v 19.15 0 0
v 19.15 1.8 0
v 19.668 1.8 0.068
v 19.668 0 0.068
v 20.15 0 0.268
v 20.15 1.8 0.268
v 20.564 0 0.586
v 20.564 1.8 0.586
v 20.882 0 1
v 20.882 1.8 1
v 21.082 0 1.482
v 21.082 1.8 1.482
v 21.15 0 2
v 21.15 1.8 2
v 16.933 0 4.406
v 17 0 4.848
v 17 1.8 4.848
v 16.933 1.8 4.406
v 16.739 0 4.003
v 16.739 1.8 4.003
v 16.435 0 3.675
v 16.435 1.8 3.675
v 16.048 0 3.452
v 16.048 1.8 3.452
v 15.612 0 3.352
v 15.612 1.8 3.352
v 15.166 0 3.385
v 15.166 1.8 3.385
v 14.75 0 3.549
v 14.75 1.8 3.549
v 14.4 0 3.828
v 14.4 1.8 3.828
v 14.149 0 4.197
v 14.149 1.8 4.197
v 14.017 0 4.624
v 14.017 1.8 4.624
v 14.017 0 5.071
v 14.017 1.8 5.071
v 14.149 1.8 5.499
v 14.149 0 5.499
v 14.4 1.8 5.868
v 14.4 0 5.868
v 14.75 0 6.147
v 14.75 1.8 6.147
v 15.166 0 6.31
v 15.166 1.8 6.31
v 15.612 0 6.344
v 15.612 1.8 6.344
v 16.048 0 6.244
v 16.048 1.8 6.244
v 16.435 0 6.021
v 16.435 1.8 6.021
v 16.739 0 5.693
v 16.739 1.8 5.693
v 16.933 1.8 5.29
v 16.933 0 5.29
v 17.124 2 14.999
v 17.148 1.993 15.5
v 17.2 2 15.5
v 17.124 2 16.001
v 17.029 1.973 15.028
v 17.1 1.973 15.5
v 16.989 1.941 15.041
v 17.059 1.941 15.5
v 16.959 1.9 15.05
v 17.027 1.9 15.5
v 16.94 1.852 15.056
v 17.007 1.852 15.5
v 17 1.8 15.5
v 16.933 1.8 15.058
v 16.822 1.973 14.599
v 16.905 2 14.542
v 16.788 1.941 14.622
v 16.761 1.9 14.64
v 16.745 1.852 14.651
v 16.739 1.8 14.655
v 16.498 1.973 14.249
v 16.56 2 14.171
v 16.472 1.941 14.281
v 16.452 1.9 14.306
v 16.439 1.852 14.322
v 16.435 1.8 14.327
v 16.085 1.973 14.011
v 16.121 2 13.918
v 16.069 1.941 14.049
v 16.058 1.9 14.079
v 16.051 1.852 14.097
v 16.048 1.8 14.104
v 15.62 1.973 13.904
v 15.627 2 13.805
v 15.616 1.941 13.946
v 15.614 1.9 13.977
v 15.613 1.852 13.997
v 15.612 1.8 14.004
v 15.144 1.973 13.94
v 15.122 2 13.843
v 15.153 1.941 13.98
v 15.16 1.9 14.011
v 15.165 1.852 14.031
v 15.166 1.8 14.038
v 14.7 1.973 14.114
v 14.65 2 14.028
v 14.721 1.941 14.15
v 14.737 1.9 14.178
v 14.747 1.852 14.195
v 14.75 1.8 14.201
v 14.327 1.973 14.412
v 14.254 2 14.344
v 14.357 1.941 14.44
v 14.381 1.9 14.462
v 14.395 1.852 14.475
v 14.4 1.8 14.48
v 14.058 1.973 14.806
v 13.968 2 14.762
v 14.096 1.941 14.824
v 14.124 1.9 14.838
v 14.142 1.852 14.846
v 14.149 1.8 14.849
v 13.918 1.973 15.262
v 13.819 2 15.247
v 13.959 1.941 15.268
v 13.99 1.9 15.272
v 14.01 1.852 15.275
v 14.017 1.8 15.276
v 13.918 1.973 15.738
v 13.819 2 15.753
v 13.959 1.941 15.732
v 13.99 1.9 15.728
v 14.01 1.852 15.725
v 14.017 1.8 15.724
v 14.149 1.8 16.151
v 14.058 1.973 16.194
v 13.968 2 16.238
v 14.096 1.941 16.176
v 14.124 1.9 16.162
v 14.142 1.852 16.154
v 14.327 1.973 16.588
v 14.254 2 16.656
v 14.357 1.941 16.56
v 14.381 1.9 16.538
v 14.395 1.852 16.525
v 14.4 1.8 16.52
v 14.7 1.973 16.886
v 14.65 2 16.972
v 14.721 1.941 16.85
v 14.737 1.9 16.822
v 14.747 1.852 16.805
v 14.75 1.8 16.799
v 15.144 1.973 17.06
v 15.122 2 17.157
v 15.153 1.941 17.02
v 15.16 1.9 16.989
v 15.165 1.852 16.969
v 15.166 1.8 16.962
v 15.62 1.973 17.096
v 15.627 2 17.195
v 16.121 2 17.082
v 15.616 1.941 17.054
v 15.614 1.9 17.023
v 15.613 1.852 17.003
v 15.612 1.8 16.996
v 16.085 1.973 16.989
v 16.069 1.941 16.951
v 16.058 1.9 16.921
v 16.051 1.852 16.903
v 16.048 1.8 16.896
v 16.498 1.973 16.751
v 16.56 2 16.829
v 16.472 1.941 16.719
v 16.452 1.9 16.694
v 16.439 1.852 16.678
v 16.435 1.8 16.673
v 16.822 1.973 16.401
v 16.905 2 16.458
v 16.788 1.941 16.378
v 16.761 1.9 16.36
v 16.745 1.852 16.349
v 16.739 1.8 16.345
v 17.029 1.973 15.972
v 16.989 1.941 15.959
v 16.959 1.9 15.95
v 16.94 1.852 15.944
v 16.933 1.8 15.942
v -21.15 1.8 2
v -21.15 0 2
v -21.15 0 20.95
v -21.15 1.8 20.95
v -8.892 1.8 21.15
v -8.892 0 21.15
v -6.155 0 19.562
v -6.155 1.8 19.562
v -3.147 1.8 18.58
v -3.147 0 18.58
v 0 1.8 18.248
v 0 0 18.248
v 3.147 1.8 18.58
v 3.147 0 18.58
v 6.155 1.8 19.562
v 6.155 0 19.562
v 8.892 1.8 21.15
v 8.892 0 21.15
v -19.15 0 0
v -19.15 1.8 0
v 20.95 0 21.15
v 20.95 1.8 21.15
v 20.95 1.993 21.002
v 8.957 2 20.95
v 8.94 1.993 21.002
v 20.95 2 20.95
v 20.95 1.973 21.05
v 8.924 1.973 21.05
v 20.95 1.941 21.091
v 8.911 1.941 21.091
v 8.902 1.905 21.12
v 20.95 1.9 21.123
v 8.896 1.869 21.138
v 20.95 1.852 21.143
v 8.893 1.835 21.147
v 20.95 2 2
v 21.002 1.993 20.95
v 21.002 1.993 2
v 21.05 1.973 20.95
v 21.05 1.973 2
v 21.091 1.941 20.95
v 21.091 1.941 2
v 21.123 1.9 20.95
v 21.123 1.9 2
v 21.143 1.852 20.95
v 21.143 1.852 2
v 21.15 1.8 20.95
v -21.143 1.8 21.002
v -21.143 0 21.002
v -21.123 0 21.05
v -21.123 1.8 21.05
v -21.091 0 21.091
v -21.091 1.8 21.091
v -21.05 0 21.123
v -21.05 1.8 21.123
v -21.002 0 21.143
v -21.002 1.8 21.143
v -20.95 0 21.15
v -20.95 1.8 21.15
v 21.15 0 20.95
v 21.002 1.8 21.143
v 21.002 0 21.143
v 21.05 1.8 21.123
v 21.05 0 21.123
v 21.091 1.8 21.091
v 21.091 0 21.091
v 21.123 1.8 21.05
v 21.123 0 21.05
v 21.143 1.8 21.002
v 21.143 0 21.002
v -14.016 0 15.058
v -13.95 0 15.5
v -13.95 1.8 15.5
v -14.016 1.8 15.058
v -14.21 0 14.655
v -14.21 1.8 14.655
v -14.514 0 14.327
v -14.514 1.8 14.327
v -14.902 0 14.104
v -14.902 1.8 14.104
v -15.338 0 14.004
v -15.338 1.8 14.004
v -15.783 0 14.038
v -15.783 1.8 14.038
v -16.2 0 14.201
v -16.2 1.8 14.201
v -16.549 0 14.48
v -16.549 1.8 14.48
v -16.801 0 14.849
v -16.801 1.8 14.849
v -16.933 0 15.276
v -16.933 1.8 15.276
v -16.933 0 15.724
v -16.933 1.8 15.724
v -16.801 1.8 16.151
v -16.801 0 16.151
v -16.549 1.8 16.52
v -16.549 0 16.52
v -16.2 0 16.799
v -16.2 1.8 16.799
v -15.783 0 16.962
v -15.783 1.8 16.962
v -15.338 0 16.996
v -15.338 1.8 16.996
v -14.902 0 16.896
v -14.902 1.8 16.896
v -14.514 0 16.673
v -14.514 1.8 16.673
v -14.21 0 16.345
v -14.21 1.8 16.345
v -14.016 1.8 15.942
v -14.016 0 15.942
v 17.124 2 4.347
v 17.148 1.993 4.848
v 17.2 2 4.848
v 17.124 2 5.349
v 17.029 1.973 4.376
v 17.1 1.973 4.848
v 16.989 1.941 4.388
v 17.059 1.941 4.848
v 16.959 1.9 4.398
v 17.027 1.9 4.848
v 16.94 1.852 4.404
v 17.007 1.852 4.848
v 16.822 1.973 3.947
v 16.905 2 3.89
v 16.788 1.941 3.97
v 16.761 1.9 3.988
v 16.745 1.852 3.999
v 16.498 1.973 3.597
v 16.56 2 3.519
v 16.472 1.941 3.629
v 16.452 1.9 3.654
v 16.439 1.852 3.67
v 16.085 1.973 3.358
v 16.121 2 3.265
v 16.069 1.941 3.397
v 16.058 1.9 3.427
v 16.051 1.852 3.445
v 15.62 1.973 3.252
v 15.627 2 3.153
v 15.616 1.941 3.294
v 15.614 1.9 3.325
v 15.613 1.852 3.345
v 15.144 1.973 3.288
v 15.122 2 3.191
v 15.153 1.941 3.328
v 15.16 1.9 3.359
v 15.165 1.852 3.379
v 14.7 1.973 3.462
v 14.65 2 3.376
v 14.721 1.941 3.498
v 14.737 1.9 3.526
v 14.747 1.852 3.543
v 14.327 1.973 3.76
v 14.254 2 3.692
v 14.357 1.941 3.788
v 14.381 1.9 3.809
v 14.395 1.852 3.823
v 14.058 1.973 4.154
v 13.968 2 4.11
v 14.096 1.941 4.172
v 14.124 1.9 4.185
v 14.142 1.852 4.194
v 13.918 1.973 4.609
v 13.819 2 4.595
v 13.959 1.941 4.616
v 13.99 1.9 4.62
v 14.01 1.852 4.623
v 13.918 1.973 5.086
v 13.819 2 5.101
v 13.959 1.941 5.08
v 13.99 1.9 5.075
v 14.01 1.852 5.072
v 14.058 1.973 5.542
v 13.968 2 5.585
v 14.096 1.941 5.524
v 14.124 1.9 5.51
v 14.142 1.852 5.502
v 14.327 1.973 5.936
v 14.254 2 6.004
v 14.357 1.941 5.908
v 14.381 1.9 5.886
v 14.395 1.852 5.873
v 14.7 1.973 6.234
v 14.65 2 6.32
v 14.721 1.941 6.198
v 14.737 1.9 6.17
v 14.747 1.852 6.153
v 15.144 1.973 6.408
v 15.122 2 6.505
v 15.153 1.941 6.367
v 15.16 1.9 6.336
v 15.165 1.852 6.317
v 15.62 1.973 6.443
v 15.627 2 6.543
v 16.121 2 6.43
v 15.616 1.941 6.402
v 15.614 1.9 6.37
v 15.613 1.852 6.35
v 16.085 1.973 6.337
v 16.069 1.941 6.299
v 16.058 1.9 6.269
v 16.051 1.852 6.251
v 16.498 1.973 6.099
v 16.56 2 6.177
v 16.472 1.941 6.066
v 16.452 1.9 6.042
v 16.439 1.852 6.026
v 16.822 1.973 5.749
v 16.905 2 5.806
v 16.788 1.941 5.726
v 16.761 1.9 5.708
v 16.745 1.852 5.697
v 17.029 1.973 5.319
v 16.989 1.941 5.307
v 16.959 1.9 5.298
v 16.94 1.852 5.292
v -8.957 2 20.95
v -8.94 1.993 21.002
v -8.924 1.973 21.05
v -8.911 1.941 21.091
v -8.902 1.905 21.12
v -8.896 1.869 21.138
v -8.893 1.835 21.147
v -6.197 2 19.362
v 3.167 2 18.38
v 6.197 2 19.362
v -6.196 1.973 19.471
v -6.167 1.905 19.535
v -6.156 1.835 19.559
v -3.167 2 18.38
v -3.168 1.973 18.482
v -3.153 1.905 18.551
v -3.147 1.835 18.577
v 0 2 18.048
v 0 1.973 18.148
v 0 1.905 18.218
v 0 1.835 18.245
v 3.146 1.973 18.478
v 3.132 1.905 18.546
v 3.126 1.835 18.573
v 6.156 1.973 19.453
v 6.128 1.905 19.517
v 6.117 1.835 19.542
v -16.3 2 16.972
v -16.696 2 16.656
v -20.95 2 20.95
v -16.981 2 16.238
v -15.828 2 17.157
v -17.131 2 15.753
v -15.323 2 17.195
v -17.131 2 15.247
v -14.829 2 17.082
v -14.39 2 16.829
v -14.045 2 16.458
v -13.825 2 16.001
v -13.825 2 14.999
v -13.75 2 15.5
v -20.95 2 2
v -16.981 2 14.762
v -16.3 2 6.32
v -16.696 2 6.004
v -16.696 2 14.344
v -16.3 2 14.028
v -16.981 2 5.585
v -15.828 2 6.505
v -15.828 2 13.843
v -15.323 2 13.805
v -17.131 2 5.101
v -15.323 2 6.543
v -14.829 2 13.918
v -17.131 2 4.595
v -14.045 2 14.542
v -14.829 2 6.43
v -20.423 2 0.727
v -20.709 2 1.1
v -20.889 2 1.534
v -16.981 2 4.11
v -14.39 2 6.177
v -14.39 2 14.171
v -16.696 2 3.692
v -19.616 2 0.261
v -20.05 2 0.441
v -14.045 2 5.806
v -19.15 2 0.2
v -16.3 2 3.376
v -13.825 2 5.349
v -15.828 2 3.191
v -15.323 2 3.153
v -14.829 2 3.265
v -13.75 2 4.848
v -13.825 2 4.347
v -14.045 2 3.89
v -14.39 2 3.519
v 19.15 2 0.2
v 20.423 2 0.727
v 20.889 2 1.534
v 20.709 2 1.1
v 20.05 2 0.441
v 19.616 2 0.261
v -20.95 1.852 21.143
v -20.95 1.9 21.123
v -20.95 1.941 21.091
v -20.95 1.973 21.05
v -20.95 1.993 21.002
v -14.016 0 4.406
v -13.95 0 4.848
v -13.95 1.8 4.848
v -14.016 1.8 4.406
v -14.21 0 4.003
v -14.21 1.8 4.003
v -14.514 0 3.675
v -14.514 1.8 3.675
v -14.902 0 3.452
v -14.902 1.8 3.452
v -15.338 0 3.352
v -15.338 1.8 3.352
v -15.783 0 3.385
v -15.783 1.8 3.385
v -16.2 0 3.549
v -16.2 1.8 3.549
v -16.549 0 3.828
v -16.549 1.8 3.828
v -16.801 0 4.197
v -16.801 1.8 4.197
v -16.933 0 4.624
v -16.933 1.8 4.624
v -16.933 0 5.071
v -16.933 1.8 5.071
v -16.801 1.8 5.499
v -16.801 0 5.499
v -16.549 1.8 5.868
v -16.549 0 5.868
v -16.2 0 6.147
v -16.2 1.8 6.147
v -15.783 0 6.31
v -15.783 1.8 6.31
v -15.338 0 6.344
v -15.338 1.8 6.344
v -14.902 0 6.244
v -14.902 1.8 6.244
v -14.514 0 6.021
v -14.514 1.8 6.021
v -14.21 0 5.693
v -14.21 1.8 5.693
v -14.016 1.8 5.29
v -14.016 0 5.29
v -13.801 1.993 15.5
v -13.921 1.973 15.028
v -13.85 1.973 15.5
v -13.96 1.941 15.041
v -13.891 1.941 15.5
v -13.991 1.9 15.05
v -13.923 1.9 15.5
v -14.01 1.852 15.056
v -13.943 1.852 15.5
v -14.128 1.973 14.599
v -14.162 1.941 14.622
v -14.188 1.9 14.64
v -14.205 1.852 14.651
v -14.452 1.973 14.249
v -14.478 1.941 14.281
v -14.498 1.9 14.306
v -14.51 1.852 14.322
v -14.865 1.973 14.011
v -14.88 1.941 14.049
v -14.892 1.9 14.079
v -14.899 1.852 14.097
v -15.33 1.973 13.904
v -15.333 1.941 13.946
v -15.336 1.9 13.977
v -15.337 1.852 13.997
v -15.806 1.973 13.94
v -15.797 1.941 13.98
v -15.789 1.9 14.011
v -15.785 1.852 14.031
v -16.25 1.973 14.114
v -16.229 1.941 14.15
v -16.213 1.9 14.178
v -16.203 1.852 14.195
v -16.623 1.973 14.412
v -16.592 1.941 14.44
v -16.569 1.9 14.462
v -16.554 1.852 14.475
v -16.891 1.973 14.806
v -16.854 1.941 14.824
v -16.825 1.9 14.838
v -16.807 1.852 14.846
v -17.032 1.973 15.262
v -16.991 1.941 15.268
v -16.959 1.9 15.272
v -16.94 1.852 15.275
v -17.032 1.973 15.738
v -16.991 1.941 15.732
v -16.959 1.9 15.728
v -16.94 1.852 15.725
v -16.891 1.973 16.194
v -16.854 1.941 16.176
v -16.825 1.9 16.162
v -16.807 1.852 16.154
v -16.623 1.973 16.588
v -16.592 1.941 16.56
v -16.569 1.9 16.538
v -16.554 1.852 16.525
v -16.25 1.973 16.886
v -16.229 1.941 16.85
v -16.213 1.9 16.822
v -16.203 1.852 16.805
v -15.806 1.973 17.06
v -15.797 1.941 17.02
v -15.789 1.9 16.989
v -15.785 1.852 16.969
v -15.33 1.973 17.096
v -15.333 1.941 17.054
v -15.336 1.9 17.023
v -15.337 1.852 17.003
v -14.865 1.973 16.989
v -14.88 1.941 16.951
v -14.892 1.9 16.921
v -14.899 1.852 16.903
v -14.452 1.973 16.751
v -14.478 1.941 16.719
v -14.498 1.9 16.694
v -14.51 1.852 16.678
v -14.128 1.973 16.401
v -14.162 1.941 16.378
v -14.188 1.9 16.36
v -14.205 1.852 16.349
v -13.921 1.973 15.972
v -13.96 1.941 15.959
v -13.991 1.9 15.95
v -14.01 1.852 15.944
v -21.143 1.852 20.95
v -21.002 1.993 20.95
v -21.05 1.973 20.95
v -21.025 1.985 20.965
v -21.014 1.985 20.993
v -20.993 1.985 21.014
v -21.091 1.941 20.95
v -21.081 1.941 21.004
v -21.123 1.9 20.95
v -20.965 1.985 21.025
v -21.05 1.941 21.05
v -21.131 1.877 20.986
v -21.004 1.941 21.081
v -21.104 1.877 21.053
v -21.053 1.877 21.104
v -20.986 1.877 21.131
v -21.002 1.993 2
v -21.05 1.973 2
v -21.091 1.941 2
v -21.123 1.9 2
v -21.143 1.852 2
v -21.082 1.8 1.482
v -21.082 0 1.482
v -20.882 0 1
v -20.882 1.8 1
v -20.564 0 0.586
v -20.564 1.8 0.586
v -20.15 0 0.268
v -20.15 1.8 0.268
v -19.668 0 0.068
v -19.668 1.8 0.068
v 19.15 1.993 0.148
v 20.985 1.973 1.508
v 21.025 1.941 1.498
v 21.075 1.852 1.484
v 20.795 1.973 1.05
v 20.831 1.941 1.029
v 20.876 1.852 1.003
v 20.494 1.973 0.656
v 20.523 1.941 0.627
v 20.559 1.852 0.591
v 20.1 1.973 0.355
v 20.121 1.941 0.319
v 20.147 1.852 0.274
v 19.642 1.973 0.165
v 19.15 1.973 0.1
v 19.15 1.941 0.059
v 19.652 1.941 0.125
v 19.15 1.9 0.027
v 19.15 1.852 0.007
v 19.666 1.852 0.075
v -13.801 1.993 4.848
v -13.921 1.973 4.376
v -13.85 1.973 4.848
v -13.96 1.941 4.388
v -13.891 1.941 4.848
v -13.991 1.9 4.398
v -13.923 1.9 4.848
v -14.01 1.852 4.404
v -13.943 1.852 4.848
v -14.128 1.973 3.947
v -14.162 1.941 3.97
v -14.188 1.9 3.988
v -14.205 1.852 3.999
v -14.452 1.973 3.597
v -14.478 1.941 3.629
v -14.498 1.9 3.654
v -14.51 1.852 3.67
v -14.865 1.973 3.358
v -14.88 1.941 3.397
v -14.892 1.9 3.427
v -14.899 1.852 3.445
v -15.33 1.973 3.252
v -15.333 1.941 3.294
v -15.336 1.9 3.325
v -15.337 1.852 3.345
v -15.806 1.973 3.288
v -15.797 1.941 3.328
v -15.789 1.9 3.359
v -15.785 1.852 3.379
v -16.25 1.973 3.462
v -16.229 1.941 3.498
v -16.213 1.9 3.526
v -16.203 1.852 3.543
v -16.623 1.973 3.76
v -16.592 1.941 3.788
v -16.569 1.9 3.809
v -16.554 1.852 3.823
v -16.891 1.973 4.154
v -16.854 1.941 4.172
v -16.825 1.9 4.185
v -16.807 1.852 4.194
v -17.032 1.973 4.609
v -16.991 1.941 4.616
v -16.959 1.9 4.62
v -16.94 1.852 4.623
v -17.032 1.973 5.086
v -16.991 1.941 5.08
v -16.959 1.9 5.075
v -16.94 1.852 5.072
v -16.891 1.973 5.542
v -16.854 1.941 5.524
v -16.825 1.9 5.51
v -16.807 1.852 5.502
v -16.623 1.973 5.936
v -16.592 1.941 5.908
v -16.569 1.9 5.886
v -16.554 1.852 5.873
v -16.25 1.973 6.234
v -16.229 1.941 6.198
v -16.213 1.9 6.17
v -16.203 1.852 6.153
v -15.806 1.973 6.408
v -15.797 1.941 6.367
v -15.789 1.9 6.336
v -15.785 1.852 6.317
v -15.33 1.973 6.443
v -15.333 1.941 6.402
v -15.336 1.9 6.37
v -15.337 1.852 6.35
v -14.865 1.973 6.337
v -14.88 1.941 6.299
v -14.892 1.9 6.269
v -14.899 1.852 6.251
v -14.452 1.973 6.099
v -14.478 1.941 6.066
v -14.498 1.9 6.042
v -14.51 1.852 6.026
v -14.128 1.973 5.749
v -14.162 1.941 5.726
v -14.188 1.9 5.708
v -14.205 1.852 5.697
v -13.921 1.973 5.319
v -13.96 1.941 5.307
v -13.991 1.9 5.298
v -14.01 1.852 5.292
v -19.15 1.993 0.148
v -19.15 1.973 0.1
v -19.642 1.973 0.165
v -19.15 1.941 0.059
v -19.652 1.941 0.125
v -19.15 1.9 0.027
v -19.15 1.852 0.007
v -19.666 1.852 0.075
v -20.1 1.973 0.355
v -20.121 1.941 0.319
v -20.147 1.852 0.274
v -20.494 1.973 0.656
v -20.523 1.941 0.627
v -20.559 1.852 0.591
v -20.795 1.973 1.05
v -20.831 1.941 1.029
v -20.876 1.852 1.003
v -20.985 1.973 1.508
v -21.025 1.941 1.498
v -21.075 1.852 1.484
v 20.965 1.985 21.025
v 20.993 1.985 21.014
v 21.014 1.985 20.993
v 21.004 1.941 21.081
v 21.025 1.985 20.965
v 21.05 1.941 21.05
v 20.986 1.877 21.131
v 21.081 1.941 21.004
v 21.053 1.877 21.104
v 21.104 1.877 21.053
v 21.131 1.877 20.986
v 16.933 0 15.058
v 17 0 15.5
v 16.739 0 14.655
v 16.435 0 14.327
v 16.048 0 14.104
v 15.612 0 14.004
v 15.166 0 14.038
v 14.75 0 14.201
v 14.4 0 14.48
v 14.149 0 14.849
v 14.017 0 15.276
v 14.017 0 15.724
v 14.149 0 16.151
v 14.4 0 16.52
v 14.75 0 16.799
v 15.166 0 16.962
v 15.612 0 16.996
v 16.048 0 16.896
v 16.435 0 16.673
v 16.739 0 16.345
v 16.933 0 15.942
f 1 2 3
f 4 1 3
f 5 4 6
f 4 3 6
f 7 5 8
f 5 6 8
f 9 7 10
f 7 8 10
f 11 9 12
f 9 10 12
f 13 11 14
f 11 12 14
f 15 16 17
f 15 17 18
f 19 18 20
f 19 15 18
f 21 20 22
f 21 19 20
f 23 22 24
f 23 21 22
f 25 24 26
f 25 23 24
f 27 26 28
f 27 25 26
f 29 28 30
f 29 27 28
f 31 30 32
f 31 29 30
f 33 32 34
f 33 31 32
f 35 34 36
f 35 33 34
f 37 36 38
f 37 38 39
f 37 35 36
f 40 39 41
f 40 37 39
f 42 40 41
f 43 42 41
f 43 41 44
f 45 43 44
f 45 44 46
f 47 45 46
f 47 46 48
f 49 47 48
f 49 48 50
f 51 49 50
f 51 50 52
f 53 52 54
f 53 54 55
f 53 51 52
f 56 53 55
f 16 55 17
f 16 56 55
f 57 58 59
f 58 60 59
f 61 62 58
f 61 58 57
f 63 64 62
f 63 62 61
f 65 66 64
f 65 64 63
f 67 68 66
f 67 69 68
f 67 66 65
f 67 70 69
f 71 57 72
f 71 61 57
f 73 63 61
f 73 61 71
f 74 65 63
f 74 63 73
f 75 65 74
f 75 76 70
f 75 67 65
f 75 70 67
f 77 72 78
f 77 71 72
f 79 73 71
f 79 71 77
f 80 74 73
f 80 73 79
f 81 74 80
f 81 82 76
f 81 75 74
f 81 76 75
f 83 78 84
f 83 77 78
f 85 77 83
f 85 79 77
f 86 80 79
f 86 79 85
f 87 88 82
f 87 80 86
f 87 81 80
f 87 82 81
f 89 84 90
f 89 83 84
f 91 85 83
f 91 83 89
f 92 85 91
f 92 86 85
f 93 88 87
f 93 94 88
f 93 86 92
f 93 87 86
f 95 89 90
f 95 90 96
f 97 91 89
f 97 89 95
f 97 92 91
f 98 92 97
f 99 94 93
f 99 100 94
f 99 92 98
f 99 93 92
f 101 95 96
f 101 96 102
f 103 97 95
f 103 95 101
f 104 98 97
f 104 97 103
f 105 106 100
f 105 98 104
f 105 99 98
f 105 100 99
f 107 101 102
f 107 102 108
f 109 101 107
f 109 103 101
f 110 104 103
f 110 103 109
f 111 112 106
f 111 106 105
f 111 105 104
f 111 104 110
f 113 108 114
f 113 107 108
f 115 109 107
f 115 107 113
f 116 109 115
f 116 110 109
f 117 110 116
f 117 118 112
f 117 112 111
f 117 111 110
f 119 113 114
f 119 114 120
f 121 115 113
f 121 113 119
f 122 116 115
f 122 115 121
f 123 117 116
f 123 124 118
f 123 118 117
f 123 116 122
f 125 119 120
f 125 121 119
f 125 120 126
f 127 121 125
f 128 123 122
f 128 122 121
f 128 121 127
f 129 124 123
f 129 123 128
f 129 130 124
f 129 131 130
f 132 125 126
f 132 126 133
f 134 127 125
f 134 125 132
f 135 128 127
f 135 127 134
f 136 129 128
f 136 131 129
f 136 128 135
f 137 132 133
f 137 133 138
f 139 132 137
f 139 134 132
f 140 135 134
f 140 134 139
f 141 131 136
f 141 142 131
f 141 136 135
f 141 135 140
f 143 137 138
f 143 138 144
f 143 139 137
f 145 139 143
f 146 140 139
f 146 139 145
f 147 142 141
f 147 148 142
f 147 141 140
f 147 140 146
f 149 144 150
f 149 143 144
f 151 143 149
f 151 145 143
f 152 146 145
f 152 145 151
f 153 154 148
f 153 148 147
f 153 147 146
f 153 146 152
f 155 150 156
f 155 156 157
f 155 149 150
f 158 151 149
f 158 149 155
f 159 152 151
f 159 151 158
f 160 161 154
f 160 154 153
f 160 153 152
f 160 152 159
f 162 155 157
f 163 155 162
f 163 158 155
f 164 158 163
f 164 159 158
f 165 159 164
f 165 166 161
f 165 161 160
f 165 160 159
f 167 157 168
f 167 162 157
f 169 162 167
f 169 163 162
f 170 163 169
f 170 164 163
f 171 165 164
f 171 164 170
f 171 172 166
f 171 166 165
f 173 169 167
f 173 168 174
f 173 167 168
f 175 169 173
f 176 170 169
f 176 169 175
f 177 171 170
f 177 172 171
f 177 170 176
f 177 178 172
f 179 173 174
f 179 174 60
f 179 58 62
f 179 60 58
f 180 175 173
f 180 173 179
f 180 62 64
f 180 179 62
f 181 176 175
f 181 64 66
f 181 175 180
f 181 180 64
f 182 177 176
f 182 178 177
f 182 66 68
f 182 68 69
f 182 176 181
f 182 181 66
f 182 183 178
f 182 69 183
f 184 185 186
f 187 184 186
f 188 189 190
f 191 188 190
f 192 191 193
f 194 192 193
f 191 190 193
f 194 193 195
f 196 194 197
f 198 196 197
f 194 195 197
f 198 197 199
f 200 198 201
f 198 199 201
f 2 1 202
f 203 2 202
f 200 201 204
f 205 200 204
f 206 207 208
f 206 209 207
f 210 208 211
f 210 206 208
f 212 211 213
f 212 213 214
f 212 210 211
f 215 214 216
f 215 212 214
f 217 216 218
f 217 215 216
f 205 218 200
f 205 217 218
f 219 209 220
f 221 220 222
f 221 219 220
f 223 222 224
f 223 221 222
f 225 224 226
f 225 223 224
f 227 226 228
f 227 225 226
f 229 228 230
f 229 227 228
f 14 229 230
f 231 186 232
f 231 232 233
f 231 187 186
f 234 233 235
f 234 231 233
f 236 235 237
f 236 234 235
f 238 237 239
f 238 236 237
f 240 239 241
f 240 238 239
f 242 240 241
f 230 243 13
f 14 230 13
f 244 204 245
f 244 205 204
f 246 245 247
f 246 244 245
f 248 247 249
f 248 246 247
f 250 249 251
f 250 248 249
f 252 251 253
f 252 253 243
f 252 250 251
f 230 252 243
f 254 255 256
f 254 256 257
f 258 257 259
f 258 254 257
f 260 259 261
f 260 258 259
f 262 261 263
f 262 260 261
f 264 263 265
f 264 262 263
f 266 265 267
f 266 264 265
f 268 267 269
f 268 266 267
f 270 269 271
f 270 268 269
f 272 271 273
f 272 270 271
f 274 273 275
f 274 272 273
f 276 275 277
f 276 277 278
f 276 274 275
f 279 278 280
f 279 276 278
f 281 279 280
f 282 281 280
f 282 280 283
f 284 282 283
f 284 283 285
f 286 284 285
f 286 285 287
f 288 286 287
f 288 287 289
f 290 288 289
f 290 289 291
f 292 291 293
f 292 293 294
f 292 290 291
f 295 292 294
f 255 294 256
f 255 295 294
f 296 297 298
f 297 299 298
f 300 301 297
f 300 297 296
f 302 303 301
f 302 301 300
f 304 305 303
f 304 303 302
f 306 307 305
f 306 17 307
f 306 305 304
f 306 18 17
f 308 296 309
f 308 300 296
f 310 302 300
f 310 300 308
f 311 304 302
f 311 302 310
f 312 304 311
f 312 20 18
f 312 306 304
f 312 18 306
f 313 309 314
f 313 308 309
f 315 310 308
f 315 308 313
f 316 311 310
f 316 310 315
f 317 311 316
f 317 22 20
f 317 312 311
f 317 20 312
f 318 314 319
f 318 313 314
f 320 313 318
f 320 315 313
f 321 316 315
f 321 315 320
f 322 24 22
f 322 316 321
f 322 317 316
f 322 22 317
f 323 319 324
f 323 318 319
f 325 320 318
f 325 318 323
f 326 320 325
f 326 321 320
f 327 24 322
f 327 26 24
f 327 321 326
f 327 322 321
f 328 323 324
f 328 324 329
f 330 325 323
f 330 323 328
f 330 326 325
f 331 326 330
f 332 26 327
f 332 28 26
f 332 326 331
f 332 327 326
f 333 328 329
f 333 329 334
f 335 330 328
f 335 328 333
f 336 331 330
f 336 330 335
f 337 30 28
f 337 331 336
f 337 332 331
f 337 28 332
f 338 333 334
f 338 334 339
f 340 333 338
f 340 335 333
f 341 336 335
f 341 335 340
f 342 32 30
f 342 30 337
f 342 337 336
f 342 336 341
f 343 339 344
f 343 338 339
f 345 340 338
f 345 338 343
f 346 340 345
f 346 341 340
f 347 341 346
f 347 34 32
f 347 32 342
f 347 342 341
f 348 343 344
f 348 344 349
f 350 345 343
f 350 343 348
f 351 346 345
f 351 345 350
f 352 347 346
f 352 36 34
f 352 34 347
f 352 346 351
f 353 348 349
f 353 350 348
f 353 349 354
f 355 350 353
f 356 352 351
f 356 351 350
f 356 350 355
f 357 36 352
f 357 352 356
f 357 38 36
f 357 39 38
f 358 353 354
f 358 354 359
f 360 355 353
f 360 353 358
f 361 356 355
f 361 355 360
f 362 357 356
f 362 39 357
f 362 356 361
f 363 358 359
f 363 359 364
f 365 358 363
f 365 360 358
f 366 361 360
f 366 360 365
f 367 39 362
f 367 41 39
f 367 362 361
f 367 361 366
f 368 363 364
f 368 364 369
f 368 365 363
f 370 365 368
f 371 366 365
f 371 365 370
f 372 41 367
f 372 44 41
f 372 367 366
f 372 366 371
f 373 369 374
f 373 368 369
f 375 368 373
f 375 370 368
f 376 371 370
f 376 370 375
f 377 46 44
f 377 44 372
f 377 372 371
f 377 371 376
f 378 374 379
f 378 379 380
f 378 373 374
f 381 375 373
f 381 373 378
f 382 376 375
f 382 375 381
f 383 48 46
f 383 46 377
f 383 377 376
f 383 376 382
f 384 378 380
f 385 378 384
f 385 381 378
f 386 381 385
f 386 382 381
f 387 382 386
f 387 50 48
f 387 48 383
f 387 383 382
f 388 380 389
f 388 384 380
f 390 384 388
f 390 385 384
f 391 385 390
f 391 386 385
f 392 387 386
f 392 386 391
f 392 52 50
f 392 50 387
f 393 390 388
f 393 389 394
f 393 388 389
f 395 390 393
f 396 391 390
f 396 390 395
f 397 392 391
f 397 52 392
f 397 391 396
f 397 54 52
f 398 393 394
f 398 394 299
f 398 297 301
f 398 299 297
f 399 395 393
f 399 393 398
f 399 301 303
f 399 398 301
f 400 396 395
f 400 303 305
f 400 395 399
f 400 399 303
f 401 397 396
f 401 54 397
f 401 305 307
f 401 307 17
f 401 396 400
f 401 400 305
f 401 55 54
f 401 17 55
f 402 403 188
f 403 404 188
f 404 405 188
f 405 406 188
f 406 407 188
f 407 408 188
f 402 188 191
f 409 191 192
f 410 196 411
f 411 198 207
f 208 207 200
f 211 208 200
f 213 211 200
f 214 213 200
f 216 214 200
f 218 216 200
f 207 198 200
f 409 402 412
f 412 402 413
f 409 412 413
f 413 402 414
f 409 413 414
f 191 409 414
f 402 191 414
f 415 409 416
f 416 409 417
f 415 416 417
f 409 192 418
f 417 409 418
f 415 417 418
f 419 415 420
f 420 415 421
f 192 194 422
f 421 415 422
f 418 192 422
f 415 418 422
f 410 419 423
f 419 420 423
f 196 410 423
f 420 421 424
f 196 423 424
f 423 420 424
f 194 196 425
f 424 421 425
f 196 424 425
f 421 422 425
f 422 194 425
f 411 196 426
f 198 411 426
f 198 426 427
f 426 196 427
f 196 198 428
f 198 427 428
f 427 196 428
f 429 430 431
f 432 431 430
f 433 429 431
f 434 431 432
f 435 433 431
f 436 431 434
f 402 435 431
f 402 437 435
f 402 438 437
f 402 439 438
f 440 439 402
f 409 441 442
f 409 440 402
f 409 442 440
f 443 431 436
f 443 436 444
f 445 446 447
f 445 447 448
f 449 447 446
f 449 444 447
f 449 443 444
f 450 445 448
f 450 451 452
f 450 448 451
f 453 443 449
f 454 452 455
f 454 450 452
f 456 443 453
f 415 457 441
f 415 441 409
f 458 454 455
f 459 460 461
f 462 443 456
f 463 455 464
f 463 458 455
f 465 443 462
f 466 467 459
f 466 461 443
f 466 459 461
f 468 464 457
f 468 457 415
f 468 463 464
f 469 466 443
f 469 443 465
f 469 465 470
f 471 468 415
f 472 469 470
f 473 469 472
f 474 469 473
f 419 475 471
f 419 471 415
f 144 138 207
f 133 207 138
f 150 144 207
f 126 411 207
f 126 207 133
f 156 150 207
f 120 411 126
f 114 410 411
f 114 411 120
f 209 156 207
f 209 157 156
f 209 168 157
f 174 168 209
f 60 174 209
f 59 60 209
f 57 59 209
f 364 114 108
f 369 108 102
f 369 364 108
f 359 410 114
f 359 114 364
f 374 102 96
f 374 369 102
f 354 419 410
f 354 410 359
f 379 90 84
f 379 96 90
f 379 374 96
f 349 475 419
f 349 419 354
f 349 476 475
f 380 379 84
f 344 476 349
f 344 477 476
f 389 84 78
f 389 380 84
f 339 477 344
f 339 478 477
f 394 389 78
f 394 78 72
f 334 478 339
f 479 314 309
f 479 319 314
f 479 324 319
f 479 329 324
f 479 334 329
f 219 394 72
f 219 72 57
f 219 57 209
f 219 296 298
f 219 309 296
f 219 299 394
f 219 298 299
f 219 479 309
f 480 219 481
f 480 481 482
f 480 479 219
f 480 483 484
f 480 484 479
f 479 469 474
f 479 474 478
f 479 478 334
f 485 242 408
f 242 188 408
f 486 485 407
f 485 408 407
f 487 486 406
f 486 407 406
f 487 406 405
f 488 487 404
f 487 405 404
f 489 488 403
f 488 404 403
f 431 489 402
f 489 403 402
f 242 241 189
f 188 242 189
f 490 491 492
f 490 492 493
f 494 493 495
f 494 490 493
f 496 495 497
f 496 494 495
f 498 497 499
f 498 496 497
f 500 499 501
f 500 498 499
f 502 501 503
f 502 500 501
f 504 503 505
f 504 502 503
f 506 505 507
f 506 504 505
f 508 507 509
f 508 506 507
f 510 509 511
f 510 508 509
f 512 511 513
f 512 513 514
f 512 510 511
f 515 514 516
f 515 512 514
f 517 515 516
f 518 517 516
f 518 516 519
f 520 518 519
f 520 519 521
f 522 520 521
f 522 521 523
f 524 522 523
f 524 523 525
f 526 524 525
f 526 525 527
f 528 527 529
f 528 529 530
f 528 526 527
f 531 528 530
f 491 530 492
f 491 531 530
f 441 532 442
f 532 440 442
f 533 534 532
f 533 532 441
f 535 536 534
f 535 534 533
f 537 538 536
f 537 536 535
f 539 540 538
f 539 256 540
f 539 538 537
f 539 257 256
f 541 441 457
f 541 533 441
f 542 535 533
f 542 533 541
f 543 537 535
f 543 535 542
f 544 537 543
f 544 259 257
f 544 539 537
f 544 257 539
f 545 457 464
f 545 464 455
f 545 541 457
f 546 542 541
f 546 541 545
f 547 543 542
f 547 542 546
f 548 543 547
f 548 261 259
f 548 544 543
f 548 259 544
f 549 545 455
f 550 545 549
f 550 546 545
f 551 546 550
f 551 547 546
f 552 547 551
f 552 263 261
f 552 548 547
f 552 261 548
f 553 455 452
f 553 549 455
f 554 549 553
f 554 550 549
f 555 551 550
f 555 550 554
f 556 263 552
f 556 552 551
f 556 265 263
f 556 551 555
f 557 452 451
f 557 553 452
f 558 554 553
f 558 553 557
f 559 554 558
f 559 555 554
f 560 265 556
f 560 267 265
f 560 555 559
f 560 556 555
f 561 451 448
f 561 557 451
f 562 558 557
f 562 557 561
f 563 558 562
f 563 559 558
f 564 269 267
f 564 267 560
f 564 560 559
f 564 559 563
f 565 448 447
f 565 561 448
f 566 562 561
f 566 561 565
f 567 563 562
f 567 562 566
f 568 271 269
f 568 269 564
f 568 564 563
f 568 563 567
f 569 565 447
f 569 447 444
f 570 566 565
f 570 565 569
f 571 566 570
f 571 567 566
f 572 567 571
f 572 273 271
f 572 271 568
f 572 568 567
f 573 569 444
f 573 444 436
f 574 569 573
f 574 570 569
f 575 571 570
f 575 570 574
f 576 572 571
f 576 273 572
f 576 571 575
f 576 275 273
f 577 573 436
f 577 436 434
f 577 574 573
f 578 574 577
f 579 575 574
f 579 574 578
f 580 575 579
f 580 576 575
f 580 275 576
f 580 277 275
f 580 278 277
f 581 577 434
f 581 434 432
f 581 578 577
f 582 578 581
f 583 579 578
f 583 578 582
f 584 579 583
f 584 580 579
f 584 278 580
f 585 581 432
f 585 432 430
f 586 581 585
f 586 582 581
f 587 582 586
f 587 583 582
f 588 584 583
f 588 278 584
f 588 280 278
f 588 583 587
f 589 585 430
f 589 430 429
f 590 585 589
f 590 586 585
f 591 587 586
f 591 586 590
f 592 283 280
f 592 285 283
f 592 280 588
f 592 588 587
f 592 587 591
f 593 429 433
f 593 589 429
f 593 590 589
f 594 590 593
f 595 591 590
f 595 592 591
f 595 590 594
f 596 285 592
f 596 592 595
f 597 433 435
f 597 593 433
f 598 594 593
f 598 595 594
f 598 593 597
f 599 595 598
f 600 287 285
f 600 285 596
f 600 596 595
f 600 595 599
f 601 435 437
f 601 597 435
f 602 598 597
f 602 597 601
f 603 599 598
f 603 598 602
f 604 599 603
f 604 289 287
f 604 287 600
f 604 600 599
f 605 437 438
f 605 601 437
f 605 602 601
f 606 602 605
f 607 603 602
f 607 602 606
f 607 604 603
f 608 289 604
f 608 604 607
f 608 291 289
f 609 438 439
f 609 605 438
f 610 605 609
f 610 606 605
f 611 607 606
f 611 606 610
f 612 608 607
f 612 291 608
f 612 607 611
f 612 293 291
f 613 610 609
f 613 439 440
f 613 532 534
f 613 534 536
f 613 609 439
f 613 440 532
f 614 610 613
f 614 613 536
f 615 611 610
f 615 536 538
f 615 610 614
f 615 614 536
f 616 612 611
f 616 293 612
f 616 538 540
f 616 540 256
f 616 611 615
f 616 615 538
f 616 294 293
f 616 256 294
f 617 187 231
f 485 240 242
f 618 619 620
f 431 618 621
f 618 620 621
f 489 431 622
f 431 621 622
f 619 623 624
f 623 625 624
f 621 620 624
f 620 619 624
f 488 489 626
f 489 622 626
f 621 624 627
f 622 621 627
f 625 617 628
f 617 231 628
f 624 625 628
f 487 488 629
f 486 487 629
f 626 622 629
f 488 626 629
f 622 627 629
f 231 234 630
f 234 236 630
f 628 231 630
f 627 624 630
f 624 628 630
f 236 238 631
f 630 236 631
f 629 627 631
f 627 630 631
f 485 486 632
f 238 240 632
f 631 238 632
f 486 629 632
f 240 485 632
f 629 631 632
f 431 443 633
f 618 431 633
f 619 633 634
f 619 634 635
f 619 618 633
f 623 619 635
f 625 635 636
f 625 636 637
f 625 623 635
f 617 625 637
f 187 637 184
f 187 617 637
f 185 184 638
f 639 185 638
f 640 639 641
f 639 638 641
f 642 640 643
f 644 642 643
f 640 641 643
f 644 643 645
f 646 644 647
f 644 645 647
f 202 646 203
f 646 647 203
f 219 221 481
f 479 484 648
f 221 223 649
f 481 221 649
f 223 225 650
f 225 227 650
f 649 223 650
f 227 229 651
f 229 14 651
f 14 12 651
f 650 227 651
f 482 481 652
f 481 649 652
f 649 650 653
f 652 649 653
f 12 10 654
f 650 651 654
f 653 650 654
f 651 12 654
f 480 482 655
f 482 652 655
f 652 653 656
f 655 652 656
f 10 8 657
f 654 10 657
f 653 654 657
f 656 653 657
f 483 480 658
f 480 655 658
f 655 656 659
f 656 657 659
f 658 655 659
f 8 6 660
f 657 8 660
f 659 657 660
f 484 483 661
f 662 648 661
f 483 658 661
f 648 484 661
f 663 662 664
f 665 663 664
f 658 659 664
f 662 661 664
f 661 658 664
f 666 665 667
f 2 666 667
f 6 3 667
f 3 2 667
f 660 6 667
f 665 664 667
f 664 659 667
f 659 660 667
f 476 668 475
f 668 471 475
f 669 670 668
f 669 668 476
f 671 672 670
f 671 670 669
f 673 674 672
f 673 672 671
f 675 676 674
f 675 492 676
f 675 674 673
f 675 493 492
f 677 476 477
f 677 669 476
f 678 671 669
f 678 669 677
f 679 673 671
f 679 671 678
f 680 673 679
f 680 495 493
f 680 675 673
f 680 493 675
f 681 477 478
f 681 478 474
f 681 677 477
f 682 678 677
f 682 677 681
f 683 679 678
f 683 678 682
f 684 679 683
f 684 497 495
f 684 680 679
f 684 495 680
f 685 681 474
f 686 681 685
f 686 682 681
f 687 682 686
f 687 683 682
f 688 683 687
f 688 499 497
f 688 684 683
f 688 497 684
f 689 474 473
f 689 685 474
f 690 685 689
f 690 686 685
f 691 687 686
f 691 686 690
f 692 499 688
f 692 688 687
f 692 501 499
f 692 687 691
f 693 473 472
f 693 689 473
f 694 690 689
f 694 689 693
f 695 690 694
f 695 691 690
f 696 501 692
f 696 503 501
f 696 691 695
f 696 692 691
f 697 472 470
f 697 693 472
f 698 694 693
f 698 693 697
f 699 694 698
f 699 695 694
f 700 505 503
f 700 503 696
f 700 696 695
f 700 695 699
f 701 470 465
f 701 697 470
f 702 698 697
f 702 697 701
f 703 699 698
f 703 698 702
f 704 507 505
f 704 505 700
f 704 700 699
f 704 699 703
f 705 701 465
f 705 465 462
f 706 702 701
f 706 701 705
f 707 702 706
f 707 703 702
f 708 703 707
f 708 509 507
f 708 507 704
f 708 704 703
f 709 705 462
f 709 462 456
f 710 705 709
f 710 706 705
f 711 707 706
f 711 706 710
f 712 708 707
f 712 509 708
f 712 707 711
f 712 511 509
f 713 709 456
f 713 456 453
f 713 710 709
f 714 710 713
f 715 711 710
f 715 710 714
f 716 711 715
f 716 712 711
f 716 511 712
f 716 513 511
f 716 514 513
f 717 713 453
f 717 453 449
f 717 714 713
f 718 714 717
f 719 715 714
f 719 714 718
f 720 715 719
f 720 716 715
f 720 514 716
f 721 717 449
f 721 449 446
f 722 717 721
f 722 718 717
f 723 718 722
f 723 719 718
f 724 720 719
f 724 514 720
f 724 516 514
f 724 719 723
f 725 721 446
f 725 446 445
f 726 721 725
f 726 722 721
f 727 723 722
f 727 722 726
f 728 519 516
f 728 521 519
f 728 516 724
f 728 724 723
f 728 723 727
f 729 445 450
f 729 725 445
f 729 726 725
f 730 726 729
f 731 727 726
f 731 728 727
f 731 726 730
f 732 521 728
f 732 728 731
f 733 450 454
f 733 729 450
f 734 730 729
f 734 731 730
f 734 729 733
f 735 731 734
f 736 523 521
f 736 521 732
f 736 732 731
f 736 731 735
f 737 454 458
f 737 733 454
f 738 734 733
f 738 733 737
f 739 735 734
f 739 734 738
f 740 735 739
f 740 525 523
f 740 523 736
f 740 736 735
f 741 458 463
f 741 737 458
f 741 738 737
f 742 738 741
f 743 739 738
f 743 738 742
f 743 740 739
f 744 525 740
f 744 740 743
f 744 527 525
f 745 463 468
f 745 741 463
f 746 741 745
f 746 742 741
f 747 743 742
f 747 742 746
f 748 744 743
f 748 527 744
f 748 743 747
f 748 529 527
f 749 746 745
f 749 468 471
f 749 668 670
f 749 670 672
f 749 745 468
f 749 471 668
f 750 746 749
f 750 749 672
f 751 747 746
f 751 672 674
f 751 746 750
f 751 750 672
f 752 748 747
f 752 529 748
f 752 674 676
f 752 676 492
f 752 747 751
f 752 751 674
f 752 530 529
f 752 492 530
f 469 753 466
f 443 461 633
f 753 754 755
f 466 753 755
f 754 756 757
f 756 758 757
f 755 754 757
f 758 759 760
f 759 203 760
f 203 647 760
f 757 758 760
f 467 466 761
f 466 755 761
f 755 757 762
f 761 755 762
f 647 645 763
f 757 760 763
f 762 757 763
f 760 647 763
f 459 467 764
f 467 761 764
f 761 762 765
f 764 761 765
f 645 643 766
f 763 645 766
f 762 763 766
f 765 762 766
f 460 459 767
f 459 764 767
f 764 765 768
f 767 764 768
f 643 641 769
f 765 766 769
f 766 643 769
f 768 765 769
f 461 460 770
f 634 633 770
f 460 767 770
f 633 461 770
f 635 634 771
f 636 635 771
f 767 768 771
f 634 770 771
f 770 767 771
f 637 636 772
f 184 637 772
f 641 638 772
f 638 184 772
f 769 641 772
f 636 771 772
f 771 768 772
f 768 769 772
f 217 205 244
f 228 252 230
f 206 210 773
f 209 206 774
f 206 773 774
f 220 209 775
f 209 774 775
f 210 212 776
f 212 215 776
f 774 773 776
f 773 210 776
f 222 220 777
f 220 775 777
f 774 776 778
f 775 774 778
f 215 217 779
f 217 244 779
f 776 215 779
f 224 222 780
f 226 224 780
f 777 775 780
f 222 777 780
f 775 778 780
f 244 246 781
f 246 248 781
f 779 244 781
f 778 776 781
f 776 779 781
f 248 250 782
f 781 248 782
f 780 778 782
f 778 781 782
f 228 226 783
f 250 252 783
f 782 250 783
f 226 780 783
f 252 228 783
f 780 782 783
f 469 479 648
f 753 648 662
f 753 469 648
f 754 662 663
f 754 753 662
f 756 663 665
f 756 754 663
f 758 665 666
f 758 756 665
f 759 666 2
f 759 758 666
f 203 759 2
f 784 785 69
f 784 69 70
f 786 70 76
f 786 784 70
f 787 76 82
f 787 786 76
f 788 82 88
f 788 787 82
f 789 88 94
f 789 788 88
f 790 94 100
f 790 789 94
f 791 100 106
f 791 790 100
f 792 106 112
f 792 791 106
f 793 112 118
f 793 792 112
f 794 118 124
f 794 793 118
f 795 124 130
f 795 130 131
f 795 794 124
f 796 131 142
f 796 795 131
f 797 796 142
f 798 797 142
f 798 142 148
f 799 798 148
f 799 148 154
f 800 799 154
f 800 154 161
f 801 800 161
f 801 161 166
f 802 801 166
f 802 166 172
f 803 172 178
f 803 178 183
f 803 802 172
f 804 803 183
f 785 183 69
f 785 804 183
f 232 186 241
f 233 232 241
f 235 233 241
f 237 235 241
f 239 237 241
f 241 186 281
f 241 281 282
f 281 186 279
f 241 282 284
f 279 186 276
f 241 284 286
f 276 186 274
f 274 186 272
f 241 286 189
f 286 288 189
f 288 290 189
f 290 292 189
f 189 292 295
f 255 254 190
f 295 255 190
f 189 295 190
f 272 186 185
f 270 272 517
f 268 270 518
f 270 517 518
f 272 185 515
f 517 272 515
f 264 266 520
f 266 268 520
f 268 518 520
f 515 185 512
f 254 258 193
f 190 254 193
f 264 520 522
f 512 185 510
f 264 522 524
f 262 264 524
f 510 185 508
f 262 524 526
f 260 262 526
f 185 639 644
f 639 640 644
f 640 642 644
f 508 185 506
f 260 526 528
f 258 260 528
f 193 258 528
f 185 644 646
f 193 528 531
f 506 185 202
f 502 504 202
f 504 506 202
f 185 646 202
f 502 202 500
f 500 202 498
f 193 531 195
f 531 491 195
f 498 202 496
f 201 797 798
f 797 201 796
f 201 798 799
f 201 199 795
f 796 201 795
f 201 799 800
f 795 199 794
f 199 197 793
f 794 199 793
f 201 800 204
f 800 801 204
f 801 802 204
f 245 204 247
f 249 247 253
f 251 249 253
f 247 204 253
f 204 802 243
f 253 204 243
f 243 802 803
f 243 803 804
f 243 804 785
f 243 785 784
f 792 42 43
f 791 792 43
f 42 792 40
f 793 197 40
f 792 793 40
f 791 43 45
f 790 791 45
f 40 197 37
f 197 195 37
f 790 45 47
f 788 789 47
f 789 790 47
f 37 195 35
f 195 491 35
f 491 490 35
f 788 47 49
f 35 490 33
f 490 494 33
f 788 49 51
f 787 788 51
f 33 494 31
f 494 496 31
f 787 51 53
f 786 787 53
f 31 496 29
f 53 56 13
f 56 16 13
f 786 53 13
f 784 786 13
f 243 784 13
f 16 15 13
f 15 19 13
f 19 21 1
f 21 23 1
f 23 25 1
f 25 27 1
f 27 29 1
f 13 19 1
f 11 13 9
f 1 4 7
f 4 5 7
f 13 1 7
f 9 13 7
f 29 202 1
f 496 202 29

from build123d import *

# Parameters (mm, degrees)
SKETCH1_R           = 1.5
BOSS_EXTRUDE1_DEPTH = 2
FILLET1_R           = 2
FILLET2_R           = 0.2


with BuildPart() as part:
    # Sketch1 → Boss-Extrude1 (new body)
    with BuildSketch(Plane(origin=(0, 0, 0), x_dir=(1, 0, 0), z_dir=(0, 1, 0))):
        with BuildLine():
            Line((-21.15, -21.15), (-8.891728161, -21.15))
            ThreePointArc((-8.891728161, -21.15), (0, -18.248189838), (8.891728161, -21.15))
            Line((8.891728161, -21.15), (21.15, -21.15))
            Line((21.15, -21.15), (21.15, 0))
            Line((21.15, 0), (-21.15, 0))
            Line((-21.15, 0), (-21.15, -21.15))
        make_face()
        with Locations((15.5, -4.847889014)):
            Circle(SKETCH1_R, mode=Mode.SUBTRACT)
        with Locations((-15.449717978, -15.5)):
            Circle(SKETCH1_R, mode=Mode.SUBTRACT)
        with Locations((15.5, -15.5)):
            Circle(SKETCH1_R, mode=Mode.SUBTRACT)
        with Locations((-15.449717978, -4.847889014)):
            Circle(SKETCH1_R, mode=Mode.SUBTRACT)
    extrude(amount=BOSS_EXTRUDE1_DEPTH)

    # Fillet1
    fillet1_edges = [part.edges().sort_by_distance(p)[0] for p in [
        (-21.15, 1, 0),
        (21.15, 1, 0),
    ]]
    fillet(fillet1_edges, radius=FILLET1_R)

    # Fillet2
    fillet2_edges = [part.edges().sort_by_distance(p)[0] for p in [
        (0, 2, 18.248189838),
        (21.15, 1, 21.15),
        (-21.15, 1, 21.15),
        (15.02086408, 2, 21.15),
        (21.15, 2, 11.575),
        (-16.949717978, 2, 15.5),
        (14, 2, 15.5),
        (14, 2, 4.847889014),
        (-16.949717978, 2, 4.847889014),
        (-21.15, 2, 11.575),
        (0, 2, 0),
        (20.564213562, 2, 0.585786438),
        (-20.564213562, 2, 0.585786438),
        (-15.02086408, 2, 21.15),
    ]]
    fillet(fillet2_edges, radius=FILLET2_R)


solid = part.part
